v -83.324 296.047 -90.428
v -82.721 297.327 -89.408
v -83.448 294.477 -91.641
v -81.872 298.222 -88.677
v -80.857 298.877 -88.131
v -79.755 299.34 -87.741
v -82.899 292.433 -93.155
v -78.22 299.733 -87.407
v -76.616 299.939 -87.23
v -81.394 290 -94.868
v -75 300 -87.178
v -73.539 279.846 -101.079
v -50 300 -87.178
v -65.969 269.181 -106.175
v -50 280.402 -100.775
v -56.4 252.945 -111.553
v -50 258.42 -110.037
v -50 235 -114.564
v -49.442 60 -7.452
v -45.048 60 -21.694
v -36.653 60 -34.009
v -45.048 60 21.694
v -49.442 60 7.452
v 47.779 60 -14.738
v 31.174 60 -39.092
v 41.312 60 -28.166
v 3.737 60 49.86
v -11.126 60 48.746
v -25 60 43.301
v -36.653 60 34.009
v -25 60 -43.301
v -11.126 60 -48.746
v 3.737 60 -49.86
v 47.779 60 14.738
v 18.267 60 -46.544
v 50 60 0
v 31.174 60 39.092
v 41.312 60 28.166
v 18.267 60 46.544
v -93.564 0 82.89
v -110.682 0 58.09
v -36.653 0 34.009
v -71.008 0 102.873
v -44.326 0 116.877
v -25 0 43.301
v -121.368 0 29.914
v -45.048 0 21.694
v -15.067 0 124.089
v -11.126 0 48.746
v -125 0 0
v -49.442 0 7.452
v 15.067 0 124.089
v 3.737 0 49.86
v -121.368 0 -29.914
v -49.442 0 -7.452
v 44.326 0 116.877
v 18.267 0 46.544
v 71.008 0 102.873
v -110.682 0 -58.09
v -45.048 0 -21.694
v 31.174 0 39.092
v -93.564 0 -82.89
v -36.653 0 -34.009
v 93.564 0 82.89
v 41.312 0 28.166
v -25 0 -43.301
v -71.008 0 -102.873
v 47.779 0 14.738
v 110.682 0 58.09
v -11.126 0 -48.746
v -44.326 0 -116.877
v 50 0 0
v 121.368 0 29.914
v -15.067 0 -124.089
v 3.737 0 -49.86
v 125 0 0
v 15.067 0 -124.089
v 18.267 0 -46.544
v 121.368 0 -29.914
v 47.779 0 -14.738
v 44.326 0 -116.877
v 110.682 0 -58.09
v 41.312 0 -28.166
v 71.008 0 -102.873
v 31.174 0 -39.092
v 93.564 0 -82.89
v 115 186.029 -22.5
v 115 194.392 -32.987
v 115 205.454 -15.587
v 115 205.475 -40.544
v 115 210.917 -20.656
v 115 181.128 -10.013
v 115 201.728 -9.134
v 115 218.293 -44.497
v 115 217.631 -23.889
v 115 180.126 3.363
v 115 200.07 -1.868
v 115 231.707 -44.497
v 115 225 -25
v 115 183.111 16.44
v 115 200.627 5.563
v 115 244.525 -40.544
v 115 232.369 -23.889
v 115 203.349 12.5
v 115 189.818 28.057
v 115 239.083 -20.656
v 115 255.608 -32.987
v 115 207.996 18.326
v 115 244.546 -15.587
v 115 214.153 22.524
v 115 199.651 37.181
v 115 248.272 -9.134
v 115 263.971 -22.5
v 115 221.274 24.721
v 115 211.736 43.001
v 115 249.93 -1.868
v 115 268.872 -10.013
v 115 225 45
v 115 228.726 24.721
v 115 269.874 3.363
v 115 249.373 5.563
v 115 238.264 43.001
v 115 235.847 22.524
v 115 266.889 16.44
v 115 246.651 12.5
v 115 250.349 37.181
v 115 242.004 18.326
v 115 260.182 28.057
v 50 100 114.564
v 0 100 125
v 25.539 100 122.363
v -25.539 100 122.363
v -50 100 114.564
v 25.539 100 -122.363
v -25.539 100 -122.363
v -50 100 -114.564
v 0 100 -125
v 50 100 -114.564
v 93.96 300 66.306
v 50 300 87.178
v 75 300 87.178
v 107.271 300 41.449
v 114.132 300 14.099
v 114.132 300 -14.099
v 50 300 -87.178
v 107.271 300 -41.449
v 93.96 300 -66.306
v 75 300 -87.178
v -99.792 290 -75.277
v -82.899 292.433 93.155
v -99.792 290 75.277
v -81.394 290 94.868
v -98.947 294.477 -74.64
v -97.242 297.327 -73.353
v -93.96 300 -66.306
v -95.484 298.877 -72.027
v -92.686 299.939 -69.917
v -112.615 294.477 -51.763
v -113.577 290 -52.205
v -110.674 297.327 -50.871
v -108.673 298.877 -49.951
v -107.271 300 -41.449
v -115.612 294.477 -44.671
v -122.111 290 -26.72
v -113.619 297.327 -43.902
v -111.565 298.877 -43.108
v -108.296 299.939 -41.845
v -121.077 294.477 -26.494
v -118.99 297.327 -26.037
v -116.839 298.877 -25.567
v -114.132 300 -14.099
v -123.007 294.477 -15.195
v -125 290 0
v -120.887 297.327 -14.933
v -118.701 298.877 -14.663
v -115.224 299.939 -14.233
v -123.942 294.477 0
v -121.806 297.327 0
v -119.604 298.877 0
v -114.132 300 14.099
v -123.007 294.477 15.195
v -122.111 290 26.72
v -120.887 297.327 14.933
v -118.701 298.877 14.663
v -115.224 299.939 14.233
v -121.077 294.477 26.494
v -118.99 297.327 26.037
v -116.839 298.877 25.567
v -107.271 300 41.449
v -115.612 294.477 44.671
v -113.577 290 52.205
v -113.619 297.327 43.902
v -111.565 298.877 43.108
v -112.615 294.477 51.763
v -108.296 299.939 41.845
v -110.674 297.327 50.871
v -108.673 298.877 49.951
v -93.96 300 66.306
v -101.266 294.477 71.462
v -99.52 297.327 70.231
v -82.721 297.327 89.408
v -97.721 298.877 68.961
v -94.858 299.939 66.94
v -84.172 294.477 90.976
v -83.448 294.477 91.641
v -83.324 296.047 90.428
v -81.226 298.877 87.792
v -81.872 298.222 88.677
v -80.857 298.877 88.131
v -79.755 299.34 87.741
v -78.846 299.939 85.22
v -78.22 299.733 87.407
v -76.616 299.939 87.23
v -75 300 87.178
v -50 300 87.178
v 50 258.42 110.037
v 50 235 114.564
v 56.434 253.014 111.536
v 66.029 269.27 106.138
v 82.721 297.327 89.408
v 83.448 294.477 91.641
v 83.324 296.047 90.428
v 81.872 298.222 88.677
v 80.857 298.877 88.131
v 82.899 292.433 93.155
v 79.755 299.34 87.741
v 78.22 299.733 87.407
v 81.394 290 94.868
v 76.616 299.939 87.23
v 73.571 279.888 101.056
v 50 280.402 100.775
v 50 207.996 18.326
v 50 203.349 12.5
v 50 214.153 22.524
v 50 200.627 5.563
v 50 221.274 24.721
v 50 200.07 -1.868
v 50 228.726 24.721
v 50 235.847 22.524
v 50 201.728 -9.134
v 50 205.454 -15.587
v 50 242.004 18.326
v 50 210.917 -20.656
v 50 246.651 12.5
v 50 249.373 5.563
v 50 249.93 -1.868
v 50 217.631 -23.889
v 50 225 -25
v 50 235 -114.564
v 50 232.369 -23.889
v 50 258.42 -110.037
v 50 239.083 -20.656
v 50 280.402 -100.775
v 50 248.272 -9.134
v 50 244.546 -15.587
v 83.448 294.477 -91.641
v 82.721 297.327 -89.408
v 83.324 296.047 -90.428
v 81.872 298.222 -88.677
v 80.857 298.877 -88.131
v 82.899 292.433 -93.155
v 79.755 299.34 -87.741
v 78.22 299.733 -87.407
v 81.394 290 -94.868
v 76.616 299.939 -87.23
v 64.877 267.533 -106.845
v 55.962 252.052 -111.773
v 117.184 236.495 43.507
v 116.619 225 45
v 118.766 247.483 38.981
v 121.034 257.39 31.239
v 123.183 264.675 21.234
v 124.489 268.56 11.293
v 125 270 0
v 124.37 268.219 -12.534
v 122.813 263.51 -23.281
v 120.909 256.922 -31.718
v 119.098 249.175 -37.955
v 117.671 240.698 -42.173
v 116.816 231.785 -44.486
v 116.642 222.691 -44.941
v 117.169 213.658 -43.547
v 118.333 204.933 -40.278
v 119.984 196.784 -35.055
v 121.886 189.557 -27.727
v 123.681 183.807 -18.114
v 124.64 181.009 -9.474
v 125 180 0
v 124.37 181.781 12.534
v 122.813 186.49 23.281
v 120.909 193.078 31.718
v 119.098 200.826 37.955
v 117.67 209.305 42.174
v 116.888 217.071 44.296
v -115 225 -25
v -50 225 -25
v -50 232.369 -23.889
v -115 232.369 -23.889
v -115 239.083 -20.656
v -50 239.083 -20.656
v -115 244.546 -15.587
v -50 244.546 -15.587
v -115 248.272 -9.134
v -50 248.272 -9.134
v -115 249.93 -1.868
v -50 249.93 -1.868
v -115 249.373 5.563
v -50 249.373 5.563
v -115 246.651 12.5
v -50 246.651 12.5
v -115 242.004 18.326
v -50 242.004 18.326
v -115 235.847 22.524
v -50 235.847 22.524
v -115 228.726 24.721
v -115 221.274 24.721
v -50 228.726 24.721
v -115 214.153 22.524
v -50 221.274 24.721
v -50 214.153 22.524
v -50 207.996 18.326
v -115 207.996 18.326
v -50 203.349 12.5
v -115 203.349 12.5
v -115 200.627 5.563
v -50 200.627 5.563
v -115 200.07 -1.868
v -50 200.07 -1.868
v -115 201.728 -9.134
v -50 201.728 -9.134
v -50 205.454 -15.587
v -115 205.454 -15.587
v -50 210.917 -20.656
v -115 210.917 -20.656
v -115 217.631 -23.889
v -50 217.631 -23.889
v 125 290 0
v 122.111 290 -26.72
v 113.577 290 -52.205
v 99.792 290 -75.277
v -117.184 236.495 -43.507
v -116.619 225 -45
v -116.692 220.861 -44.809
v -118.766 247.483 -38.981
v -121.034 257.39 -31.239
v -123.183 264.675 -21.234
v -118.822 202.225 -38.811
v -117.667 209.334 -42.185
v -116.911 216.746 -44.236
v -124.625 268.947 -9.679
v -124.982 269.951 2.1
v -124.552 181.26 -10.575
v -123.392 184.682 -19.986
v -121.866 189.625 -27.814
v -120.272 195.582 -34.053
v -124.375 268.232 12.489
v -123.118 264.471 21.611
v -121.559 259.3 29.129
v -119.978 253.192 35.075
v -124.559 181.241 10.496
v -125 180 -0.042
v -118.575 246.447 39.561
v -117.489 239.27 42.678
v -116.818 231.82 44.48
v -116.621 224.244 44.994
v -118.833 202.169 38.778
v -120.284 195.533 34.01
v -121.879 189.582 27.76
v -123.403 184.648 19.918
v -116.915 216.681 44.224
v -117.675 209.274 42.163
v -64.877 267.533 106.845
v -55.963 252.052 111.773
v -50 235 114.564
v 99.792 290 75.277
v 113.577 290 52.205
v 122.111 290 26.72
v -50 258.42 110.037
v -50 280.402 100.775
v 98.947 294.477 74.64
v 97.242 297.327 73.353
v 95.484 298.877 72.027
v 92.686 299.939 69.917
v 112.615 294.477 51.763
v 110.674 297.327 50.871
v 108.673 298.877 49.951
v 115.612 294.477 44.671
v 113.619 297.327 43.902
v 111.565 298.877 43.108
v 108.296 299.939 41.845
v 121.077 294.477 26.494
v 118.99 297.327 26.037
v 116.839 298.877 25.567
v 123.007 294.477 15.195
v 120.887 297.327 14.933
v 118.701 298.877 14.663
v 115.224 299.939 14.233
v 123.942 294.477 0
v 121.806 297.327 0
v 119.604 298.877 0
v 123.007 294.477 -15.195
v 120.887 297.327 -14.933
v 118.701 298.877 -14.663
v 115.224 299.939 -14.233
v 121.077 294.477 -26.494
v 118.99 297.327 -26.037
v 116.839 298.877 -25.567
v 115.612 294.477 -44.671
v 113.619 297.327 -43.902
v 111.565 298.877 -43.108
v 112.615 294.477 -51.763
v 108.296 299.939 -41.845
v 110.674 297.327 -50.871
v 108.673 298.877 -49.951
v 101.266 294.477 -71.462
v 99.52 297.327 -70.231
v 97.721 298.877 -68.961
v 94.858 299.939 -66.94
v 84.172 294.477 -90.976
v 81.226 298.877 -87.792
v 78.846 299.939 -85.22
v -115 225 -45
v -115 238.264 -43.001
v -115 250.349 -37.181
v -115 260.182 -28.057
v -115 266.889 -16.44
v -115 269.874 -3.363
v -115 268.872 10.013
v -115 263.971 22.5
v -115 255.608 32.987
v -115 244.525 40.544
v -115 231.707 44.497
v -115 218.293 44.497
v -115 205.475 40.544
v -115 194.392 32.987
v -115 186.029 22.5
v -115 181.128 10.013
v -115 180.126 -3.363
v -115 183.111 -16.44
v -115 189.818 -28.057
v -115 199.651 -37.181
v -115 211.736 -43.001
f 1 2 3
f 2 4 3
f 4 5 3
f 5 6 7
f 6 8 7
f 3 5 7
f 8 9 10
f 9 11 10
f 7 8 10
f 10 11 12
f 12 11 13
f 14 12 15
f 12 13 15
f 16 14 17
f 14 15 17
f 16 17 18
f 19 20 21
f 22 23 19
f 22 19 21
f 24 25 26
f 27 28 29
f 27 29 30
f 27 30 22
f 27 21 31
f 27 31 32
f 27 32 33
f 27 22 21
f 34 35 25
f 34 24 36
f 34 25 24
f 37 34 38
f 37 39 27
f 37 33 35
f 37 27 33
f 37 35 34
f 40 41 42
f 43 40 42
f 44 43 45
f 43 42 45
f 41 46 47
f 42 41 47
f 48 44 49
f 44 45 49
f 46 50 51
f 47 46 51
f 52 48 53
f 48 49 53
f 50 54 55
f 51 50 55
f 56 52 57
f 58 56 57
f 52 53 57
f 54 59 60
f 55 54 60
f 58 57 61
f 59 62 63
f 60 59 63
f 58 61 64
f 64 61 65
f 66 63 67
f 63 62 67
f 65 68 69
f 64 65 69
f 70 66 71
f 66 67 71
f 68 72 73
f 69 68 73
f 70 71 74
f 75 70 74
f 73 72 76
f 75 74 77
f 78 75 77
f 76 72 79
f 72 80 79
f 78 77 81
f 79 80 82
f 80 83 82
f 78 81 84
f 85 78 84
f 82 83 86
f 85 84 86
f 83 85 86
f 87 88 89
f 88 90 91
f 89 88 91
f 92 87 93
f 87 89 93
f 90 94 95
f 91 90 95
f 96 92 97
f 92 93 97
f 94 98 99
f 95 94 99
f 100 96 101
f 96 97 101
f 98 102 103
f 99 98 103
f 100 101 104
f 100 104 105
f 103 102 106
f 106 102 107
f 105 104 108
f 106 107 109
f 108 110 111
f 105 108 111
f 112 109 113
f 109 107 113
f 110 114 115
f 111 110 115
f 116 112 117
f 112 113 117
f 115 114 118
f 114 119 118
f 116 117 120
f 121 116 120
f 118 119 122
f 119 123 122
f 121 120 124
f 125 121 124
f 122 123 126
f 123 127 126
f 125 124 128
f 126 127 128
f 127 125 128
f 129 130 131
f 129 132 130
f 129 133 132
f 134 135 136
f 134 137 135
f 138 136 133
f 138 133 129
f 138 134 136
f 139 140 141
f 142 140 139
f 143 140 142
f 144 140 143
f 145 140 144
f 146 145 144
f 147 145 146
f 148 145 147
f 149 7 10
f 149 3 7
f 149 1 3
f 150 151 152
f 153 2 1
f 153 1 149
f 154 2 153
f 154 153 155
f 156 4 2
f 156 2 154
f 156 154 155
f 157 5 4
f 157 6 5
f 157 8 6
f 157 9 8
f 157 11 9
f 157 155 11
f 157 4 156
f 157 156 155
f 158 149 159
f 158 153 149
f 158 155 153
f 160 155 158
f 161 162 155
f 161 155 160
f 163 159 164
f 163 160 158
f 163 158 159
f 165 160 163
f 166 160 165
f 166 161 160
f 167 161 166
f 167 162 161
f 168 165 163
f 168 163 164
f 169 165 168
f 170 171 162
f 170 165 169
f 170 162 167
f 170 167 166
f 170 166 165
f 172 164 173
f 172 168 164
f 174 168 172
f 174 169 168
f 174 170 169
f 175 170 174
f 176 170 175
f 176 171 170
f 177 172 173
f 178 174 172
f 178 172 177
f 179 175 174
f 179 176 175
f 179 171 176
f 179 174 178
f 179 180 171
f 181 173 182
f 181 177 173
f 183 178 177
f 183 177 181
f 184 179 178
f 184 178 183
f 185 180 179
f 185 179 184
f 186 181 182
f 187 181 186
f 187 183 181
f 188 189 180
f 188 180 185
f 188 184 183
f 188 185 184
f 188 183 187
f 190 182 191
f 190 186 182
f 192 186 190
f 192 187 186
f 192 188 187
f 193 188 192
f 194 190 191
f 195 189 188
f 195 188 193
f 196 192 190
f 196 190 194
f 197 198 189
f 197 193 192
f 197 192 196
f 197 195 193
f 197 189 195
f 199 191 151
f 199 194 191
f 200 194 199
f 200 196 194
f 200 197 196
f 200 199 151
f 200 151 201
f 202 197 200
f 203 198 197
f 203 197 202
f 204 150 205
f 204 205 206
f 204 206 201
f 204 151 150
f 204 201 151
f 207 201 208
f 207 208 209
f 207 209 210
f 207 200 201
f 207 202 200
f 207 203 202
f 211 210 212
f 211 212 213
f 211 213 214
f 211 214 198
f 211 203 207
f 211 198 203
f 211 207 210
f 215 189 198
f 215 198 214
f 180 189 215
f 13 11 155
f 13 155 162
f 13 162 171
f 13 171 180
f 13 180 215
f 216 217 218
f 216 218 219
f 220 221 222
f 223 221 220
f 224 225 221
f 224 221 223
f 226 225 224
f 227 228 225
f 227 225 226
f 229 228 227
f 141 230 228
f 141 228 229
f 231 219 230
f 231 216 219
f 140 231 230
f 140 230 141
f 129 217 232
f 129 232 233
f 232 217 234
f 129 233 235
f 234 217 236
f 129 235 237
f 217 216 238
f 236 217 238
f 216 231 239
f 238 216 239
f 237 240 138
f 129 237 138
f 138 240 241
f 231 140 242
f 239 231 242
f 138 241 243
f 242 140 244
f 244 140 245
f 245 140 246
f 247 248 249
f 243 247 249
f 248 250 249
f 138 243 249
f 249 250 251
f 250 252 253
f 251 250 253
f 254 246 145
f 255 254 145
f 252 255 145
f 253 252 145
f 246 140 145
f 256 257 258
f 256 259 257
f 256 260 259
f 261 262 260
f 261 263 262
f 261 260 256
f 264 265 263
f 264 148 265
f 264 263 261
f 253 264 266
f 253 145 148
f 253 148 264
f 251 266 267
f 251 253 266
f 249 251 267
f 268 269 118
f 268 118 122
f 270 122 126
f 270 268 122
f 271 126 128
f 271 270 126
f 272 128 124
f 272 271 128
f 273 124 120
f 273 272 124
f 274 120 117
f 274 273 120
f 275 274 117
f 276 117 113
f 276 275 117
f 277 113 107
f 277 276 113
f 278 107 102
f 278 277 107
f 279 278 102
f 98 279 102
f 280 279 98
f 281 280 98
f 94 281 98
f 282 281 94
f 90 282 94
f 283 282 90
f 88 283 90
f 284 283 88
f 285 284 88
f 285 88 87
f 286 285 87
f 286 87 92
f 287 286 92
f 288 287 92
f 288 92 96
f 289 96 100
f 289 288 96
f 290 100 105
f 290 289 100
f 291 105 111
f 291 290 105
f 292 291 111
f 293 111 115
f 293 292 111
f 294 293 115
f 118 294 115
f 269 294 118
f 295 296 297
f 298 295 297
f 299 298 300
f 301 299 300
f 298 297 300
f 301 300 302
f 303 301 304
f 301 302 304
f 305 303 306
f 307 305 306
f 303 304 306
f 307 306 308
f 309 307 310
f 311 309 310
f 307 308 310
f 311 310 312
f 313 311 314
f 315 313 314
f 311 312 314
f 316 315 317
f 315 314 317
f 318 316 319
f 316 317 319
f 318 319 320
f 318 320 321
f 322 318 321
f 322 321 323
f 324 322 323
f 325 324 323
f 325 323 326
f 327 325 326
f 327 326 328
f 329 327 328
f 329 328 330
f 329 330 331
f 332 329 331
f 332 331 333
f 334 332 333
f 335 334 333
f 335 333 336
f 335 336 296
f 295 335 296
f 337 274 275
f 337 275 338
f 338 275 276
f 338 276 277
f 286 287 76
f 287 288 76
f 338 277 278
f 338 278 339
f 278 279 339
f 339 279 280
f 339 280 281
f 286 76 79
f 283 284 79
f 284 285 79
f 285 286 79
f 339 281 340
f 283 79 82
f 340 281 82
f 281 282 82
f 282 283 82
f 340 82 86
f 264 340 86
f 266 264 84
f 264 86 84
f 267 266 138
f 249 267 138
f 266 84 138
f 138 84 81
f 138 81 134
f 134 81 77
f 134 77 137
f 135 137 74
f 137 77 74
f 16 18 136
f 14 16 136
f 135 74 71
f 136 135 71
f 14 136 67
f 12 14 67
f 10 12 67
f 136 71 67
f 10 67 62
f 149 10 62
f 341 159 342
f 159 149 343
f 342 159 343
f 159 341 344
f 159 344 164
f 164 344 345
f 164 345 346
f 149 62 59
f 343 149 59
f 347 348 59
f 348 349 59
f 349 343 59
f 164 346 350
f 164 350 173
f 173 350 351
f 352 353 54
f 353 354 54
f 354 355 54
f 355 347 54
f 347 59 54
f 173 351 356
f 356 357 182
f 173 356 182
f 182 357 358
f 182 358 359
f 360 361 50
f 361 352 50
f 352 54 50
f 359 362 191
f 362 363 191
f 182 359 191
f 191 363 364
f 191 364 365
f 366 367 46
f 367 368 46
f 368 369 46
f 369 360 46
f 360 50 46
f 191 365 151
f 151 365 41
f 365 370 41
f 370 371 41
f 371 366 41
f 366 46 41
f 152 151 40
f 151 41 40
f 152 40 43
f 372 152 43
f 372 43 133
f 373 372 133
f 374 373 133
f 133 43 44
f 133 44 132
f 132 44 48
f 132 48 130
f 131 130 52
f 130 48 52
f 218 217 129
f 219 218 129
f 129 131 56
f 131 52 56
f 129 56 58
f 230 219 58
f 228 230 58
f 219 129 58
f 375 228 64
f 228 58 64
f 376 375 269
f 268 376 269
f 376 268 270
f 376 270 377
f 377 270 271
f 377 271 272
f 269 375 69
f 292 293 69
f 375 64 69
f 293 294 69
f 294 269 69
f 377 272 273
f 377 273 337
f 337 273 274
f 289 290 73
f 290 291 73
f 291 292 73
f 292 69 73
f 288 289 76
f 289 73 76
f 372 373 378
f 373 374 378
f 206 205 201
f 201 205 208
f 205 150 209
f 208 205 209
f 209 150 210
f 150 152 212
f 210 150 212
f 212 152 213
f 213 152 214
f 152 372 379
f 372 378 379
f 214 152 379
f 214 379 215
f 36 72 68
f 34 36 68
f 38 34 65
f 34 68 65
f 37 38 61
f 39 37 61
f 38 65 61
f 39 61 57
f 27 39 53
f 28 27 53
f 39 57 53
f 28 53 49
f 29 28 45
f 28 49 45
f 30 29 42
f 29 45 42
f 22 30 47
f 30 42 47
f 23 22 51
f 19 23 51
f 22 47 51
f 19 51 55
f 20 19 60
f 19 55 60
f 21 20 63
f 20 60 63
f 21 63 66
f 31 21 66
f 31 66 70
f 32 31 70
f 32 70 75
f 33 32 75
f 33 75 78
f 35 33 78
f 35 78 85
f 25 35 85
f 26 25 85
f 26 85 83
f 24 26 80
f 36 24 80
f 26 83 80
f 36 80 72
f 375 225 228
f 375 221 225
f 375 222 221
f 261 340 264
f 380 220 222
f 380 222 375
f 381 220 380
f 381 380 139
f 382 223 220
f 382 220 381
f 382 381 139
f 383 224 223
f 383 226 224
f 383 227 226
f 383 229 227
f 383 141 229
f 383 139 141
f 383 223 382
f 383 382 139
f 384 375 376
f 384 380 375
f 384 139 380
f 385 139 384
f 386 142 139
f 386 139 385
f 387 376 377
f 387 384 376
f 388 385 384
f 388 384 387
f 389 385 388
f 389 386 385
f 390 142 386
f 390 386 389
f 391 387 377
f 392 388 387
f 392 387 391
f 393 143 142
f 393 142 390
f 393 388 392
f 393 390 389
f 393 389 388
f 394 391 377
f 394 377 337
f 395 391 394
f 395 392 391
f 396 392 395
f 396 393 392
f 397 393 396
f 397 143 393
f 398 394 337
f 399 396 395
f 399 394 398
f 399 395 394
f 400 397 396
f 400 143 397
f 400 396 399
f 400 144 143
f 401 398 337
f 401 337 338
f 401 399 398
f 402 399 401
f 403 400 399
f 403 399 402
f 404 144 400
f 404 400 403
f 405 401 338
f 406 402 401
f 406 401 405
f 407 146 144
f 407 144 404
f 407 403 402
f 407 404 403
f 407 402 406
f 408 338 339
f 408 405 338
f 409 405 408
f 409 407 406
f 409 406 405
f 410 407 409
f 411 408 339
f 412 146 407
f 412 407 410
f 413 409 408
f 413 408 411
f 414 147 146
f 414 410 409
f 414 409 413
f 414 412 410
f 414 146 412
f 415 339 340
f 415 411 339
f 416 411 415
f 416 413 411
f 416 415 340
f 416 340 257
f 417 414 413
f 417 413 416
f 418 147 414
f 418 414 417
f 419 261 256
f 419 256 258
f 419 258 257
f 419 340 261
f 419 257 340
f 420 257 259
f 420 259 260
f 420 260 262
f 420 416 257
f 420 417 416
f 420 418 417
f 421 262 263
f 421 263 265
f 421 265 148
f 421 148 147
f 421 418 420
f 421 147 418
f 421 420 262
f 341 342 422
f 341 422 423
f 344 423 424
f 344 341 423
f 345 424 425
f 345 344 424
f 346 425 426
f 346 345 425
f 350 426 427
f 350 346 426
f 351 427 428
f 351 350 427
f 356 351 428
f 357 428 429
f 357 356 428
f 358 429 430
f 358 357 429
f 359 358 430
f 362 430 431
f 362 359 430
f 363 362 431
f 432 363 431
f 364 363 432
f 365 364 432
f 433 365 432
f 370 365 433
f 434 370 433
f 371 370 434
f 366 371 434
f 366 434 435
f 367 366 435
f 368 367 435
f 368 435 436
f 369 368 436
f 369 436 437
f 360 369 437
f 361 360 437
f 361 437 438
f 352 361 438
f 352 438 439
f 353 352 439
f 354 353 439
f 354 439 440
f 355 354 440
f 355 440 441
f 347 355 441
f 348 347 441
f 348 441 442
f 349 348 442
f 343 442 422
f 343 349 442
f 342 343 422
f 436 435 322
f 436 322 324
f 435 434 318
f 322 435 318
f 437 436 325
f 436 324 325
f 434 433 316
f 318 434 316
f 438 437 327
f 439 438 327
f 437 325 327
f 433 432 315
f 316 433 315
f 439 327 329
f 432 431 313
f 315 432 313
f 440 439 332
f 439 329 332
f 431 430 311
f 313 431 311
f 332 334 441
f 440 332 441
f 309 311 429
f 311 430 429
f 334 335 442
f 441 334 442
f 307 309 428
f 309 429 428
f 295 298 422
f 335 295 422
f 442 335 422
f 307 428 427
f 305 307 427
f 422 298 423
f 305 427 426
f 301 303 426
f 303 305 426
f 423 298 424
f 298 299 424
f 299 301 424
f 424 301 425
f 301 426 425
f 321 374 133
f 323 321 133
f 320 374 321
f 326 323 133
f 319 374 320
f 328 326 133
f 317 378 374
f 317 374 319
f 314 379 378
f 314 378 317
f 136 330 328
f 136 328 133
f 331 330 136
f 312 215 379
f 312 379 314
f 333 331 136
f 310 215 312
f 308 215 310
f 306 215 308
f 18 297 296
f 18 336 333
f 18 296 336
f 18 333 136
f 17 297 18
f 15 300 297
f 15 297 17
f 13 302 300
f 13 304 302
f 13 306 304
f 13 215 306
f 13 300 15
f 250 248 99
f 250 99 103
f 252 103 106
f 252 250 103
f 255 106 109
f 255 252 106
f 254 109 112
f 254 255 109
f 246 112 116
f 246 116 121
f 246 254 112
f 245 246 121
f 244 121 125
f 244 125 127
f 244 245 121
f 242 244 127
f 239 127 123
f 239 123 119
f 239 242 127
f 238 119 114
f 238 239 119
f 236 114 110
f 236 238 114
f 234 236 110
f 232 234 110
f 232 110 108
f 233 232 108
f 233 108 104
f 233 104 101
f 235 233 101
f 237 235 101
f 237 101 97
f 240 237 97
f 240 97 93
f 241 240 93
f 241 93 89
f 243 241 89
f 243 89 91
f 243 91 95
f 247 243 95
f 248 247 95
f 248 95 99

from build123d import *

# Parameters (mm, degrees)
SKETCH1_R               = 125
BOSS_EXTRUDE1_DEPTH     = 300
SKETCH2_W               = 100
SKETCH2_H               = 250
CUT_EXTRUDE1_DEPTH      = 200
SKETCH4_R               = 50
CUT_EXTRUDE3_DEPTH      = 60
SKETCH7_R               = 25
CUT_EXTRUDE6_DEPTH      = 176
CUT_EXTRUDE6_DEPTH_BACK = 76
FILLET2_R               = 10
SKETCH8_R               = 45
SKETCH8_R_2             = 25
CUT_EXTRUDE7_DEPTH      = 10
SKETCH10_R              = 45
SKETCH10_R_2            = 25
CUT_EXTRUDE8_DEPTH      = 10


with BuildPart() as part:
    # Sketch1 → Boss-Extrude1 (new body)
    with BuildSketch(Plane(origin=(0, 0, 0), x_dir=(1, 0, 0), z_dir=(0, 1, 0))):
        Circle(SKETCH1_R)
    extrude(amount=BOSS_EXTRUDE1_DEPTH)

    # Sketch2 → Cut-Extrude1 (cut)
    with BuildSketch(Plane(origin=(0, 300, 0), x_dir=(1, 0, 0), z_dir=(0, 1, 0))):
        Rectangle(SKETCH2_W, SKETCH2_H)
    extrude(amount=-CUT_EXTRUDE1_DEPTH, mode=Mode.SUBTRACT)

    # Sketch4 → Cut-Extrude3 (cut)
    with BuildSketch(Plane.XZ):
        Circle(SKETCH4_R)
    extrude(amount=-CUT_EXTRUDE3_DEPTH, mode=Mode.SUBTRACT)

    # Sketch7 → Cut-Extrude6 (cut, two sides)
    with BuildSketch(Plane(origin=(-50, 0, 0), x_dir=(0, 0, -1), z_dir=(1, 0, 0))) as cut_extrude6_sk:
        with BuildLine():
            Line((-87.177978871, 300), (-114.564392374, 300))
            Line((-114.564392374, 300), (-114.564392374, 235))
            ThreePointArc((-114.564392374, 235), (-105.977573518, 269.651471545), (-87.177978871, 300))
        make_face()
        with BuildLine():
            ThreePointArc((87.177978871, 300), (105.977573518, 269.651471545), (114.564392374, 235))
            Line((114.564392374, 235), (114.564392374, 300))
            Line((114.564392374, 300), (87.177978871, 300))
        make_face()
        with Locations((0, 225)):
            Circle(SKETCH7_R)
    extrude(amount=CUT_EXTRUDE6_DEPTH, mode=Mode.SUBTRACT)
    extrude(cut_extrude6_sk.sketch, amount=-CUT_EXTRUDE6_DEPTH_BACK, mode=Mode.SUBTRACT)

    # Fillet2
    fillet2_edges = [part.edges().sort_by_distance(p)[0] for p in [
        (115.807589436, 300, 47.048934409),
        (-125, 300, 0),
    ]]
    fillet(fillet2_edges, radius=FILLET2_R)

    # Sketch8 → Cut-Extrude7 (cut)
    with BuildSketch(Plane(origin=(-125, 0, 0), x_dir=(0, 0, -1), z_dir=(1, 0, 0))):
        with Locations((0, 225)):
            Circle(SKETCH8_R)
        with Locations((0, 225)):
            Circle(SKETCH8_R_2, mode=Mode.SUBTRACT)
    extrude(amount=CUT_EXTRUDE7_DEPTH, mode=Mode.SUBTRACT)

    # Sketch10 → Cut-Extrude8 (cut)
    with BuildSketch(Plane.ZY.offset(-125)):
        with Locations((0, 225)):
            Circle(SKETCH10_R)
        with Locations((0, 225)):
            Circle(SKETCH10_R_2, mode=Mode.SUBTRACT)
    extrude(amount=CUT_EXTRUDE8_DEPTH, mode=Mode.SUBTRACT)


solid = part.part
